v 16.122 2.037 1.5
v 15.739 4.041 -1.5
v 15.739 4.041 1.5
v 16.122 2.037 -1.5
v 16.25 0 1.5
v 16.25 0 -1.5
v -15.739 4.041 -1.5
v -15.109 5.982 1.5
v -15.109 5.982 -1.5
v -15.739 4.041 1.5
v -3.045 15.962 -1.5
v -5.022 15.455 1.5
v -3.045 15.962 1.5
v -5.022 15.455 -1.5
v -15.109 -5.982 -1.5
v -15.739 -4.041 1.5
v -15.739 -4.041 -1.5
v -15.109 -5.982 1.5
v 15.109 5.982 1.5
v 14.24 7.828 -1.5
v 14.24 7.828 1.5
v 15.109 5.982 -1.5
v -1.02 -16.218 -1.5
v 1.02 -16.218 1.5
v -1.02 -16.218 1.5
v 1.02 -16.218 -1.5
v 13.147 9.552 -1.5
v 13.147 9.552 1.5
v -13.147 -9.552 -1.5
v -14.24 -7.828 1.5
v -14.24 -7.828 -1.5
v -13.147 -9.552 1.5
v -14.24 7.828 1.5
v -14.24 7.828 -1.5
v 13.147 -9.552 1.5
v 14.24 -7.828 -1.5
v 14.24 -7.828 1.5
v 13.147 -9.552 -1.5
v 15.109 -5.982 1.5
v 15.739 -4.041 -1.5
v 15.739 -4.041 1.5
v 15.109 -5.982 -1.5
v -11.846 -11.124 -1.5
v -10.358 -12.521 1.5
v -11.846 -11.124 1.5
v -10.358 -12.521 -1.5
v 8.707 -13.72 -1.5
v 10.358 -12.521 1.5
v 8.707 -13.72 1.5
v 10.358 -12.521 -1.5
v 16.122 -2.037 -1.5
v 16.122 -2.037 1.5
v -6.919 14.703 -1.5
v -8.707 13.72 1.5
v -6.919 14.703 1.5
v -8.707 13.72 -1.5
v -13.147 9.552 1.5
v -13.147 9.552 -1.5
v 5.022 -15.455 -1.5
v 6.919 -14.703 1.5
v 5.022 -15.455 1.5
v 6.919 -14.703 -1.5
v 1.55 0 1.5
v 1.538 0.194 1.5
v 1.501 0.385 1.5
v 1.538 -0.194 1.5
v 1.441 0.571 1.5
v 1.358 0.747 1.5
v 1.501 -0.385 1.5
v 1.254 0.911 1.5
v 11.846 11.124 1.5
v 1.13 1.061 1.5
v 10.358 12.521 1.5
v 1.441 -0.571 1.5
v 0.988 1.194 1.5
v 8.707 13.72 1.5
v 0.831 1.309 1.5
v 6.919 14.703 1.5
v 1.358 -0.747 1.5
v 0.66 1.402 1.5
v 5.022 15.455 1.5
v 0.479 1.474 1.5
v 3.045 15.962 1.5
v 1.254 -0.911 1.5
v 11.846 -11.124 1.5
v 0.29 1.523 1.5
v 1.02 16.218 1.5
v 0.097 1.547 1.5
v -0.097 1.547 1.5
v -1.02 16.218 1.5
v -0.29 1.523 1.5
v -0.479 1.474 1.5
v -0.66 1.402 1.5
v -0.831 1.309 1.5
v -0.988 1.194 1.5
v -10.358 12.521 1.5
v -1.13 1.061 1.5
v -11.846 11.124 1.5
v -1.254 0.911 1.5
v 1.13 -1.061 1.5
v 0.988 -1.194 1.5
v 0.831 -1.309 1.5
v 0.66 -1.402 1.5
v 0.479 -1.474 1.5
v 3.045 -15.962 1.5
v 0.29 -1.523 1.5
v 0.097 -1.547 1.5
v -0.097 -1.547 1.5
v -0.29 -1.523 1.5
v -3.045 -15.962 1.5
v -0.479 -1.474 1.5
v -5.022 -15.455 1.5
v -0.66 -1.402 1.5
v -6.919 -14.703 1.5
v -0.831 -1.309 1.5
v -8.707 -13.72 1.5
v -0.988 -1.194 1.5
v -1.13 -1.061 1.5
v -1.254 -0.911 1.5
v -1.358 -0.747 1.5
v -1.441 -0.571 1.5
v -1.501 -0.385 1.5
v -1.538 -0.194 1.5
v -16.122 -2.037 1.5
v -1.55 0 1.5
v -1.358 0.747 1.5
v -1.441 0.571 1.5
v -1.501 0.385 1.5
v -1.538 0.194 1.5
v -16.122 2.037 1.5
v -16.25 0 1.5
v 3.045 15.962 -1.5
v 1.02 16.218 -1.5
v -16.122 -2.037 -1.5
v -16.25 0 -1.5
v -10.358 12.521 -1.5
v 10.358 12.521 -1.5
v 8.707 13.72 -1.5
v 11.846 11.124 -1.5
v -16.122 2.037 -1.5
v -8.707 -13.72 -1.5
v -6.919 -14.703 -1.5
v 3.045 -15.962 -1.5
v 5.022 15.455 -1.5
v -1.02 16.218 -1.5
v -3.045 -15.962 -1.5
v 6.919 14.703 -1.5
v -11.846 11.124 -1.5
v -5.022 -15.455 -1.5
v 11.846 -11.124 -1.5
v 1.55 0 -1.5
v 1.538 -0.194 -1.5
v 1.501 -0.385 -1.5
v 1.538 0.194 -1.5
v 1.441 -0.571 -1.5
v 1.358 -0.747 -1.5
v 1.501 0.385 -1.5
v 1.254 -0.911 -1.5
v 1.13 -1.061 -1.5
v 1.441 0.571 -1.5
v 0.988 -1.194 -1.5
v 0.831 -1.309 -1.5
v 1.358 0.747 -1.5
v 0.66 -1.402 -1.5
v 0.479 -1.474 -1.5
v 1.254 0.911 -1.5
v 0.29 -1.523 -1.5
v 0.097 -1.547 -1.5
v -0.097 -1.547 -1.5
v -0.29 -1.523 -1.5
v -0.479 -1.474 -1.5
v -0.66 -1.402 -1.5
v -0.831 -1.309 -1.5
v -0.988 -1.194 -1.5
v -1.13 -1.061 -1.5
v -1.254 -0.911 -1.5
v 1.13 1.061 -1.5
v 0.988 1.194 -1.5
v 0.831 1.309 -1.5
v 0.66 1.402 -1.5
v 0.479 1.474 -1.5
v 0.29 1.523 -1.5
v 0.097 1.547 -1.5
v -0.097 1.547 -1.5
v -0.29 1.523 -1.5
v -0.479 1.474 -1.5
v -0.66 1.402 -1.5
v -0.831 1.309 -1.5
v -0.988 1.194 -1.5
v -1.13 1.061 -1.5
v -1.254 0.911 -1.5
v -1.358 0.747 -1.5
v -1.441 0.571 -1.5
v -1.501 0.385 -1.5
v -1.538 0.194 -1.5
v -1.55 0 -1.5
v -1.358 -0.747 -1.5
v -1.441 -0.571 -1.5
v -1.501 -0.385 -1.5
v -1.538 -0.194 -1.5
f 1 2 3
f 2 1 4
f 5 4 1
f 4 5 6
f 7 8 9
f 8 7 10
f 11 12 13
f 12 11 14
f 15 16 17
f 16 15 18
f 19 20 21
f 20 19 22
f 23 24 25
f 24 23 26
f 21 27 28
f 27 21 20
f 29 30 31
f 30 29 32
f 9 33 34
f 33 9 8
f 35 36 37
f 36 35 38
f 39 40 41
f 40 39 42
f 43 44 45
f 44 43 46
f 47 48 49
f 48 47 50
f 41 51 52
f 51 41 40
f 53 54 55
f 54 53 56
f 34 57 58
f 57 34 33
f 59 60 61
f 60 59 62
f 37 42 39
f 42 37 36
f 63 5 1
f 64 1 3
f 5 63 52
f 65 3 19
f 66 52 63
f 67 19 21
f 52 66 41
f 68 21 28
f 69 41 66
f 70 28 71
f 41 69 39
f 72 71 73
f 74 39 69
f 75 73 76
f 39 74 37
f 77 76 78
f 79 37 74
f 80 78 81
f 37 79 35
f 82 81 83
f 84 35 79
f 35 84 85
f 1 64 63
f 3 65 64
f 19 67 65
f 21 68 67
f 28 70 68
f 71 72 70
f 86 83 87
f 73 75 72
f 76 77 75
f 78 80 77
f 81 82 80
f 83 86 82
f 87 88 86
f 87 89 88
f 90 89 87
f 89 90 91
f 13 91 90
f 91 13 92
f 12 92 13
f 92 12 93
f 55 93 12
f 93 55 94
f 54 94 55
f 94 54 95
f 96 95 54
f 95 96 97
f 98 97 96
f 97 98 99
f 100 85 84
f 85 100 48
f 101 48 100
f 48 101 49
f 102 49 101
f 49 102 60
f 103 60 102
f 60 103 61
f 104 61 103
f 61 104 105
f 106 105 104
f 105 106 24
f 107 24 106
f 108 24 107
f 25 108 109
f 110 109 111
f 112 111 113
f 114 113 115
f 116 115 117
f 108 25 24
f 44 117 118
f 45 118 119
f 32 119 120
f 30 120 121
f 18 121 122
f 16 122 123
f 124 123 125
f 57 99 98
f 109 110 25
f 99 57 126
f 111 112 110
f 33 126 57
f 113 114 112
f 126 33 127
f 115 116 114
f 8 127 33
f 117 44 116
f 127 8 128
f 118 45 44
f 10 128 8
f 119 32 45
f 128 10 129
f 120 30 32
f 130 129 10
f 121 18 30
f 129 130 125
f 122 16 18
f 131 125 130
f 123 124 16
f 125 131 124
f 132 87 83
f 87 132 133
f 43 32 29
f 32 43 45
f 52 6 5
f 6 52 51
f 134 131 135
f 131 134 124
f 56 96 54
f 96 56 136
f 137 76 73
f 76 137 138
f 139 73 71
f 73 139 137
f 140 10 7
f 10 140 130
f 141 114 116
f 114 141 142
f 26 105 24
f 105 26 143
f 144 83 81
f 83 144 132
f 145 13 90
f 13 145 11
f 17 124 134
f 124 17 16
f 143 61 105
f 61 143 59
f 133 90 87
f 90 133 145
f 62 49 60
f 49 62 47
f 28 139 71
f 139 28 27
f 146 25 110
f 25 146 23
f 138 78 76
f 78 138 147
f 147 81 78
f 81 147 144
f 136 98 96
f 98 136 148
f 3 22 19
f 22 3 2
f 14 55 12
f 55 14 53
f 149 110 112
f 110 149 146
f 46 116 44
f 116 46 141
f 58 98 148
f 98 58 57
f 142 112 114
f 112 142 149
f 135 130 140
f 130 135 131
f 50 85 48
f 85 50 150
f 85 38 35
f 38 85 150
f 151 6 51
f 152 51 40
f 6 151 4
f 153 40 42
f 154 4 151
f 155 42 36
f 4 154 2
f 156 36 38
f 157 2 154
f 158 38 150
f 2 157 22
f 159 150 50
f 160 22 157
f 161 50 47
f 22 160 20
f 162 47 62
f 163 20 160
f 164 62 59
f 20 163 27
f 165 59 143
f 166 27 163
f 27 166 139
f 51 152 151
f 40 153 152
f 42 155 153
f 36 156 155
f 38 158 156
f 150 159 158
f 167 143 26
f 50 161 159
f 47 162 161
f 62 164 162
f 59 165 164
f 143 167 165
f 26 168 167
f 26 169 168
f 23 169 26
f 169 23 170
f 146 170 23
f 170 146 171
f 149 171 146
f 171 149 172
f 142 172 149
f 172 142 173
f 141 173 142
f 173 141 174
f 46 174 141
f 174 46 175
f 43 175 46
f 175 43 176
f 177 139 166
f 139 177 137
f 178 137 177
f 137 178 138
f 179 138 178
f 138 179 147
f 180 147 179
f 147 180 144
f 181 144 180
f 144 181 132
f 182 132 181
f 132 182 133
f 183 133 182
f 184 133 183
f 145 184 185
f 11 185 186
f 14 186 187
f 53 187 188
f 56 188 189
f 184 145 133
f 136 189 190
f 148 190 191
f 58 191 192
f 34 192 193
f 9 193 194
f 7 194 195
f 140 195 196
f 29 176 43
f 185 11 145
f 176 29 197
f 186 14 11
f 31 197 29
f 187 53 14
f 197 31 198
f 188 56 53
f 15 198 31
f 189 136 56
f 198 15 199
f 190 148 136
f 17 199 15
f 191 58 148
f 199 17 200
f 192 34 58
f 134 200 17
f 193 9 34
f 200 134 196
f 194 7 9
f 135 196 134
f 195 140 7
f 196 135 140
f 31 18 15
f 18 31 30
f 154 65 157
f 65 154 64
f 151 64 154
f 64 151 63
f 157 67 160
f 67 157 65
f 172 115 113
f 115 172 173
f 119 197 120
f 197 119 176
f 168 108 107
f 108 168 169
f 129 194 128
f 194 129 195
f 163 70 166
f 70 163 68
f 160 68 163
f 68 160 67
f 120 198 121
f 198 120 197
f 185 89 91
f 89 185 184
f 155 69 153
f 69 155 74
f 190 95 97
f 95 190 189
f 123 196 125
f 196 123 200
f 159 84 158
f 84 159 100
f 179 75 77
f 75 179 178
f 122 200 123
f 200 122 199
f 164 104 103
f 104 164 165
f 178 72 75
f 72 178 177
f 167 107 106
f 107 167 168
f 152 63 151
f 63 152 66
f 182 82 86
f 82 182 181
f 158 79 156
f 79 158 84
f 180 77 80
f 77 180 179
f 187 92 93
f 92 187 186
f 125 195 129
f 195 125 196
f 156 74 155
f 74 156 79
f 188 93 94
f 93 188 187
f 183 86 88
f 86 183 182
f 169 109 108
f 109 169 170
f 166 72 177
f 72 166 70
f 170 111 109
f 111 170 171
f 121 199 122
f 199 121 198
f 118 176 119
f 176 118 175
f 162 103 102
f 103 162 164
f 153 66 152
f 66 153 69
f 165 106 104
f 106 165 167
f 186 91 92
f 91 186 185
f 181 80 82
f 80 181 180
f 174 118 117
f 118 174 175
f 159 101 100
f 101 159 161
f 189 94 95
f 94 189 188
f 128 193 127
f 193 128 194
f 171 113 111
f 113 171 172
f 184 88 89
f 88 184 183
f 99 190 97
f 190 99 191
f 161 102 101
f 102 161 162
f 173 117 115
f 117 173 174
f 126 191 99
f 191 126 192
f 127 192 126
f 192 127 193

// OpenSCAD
$fn = 50;


difference() {
	union() {
		translate(v = [0, 0, -1.5000000000]) {
			cylinder(h = 3, r = 16.2500000000);
		}
	}
	union() {
		translate(v = [0, 0, -100.0000000000]) {
			cylinder(h = 200, r = 1.5500000000);
		}
	}
}
